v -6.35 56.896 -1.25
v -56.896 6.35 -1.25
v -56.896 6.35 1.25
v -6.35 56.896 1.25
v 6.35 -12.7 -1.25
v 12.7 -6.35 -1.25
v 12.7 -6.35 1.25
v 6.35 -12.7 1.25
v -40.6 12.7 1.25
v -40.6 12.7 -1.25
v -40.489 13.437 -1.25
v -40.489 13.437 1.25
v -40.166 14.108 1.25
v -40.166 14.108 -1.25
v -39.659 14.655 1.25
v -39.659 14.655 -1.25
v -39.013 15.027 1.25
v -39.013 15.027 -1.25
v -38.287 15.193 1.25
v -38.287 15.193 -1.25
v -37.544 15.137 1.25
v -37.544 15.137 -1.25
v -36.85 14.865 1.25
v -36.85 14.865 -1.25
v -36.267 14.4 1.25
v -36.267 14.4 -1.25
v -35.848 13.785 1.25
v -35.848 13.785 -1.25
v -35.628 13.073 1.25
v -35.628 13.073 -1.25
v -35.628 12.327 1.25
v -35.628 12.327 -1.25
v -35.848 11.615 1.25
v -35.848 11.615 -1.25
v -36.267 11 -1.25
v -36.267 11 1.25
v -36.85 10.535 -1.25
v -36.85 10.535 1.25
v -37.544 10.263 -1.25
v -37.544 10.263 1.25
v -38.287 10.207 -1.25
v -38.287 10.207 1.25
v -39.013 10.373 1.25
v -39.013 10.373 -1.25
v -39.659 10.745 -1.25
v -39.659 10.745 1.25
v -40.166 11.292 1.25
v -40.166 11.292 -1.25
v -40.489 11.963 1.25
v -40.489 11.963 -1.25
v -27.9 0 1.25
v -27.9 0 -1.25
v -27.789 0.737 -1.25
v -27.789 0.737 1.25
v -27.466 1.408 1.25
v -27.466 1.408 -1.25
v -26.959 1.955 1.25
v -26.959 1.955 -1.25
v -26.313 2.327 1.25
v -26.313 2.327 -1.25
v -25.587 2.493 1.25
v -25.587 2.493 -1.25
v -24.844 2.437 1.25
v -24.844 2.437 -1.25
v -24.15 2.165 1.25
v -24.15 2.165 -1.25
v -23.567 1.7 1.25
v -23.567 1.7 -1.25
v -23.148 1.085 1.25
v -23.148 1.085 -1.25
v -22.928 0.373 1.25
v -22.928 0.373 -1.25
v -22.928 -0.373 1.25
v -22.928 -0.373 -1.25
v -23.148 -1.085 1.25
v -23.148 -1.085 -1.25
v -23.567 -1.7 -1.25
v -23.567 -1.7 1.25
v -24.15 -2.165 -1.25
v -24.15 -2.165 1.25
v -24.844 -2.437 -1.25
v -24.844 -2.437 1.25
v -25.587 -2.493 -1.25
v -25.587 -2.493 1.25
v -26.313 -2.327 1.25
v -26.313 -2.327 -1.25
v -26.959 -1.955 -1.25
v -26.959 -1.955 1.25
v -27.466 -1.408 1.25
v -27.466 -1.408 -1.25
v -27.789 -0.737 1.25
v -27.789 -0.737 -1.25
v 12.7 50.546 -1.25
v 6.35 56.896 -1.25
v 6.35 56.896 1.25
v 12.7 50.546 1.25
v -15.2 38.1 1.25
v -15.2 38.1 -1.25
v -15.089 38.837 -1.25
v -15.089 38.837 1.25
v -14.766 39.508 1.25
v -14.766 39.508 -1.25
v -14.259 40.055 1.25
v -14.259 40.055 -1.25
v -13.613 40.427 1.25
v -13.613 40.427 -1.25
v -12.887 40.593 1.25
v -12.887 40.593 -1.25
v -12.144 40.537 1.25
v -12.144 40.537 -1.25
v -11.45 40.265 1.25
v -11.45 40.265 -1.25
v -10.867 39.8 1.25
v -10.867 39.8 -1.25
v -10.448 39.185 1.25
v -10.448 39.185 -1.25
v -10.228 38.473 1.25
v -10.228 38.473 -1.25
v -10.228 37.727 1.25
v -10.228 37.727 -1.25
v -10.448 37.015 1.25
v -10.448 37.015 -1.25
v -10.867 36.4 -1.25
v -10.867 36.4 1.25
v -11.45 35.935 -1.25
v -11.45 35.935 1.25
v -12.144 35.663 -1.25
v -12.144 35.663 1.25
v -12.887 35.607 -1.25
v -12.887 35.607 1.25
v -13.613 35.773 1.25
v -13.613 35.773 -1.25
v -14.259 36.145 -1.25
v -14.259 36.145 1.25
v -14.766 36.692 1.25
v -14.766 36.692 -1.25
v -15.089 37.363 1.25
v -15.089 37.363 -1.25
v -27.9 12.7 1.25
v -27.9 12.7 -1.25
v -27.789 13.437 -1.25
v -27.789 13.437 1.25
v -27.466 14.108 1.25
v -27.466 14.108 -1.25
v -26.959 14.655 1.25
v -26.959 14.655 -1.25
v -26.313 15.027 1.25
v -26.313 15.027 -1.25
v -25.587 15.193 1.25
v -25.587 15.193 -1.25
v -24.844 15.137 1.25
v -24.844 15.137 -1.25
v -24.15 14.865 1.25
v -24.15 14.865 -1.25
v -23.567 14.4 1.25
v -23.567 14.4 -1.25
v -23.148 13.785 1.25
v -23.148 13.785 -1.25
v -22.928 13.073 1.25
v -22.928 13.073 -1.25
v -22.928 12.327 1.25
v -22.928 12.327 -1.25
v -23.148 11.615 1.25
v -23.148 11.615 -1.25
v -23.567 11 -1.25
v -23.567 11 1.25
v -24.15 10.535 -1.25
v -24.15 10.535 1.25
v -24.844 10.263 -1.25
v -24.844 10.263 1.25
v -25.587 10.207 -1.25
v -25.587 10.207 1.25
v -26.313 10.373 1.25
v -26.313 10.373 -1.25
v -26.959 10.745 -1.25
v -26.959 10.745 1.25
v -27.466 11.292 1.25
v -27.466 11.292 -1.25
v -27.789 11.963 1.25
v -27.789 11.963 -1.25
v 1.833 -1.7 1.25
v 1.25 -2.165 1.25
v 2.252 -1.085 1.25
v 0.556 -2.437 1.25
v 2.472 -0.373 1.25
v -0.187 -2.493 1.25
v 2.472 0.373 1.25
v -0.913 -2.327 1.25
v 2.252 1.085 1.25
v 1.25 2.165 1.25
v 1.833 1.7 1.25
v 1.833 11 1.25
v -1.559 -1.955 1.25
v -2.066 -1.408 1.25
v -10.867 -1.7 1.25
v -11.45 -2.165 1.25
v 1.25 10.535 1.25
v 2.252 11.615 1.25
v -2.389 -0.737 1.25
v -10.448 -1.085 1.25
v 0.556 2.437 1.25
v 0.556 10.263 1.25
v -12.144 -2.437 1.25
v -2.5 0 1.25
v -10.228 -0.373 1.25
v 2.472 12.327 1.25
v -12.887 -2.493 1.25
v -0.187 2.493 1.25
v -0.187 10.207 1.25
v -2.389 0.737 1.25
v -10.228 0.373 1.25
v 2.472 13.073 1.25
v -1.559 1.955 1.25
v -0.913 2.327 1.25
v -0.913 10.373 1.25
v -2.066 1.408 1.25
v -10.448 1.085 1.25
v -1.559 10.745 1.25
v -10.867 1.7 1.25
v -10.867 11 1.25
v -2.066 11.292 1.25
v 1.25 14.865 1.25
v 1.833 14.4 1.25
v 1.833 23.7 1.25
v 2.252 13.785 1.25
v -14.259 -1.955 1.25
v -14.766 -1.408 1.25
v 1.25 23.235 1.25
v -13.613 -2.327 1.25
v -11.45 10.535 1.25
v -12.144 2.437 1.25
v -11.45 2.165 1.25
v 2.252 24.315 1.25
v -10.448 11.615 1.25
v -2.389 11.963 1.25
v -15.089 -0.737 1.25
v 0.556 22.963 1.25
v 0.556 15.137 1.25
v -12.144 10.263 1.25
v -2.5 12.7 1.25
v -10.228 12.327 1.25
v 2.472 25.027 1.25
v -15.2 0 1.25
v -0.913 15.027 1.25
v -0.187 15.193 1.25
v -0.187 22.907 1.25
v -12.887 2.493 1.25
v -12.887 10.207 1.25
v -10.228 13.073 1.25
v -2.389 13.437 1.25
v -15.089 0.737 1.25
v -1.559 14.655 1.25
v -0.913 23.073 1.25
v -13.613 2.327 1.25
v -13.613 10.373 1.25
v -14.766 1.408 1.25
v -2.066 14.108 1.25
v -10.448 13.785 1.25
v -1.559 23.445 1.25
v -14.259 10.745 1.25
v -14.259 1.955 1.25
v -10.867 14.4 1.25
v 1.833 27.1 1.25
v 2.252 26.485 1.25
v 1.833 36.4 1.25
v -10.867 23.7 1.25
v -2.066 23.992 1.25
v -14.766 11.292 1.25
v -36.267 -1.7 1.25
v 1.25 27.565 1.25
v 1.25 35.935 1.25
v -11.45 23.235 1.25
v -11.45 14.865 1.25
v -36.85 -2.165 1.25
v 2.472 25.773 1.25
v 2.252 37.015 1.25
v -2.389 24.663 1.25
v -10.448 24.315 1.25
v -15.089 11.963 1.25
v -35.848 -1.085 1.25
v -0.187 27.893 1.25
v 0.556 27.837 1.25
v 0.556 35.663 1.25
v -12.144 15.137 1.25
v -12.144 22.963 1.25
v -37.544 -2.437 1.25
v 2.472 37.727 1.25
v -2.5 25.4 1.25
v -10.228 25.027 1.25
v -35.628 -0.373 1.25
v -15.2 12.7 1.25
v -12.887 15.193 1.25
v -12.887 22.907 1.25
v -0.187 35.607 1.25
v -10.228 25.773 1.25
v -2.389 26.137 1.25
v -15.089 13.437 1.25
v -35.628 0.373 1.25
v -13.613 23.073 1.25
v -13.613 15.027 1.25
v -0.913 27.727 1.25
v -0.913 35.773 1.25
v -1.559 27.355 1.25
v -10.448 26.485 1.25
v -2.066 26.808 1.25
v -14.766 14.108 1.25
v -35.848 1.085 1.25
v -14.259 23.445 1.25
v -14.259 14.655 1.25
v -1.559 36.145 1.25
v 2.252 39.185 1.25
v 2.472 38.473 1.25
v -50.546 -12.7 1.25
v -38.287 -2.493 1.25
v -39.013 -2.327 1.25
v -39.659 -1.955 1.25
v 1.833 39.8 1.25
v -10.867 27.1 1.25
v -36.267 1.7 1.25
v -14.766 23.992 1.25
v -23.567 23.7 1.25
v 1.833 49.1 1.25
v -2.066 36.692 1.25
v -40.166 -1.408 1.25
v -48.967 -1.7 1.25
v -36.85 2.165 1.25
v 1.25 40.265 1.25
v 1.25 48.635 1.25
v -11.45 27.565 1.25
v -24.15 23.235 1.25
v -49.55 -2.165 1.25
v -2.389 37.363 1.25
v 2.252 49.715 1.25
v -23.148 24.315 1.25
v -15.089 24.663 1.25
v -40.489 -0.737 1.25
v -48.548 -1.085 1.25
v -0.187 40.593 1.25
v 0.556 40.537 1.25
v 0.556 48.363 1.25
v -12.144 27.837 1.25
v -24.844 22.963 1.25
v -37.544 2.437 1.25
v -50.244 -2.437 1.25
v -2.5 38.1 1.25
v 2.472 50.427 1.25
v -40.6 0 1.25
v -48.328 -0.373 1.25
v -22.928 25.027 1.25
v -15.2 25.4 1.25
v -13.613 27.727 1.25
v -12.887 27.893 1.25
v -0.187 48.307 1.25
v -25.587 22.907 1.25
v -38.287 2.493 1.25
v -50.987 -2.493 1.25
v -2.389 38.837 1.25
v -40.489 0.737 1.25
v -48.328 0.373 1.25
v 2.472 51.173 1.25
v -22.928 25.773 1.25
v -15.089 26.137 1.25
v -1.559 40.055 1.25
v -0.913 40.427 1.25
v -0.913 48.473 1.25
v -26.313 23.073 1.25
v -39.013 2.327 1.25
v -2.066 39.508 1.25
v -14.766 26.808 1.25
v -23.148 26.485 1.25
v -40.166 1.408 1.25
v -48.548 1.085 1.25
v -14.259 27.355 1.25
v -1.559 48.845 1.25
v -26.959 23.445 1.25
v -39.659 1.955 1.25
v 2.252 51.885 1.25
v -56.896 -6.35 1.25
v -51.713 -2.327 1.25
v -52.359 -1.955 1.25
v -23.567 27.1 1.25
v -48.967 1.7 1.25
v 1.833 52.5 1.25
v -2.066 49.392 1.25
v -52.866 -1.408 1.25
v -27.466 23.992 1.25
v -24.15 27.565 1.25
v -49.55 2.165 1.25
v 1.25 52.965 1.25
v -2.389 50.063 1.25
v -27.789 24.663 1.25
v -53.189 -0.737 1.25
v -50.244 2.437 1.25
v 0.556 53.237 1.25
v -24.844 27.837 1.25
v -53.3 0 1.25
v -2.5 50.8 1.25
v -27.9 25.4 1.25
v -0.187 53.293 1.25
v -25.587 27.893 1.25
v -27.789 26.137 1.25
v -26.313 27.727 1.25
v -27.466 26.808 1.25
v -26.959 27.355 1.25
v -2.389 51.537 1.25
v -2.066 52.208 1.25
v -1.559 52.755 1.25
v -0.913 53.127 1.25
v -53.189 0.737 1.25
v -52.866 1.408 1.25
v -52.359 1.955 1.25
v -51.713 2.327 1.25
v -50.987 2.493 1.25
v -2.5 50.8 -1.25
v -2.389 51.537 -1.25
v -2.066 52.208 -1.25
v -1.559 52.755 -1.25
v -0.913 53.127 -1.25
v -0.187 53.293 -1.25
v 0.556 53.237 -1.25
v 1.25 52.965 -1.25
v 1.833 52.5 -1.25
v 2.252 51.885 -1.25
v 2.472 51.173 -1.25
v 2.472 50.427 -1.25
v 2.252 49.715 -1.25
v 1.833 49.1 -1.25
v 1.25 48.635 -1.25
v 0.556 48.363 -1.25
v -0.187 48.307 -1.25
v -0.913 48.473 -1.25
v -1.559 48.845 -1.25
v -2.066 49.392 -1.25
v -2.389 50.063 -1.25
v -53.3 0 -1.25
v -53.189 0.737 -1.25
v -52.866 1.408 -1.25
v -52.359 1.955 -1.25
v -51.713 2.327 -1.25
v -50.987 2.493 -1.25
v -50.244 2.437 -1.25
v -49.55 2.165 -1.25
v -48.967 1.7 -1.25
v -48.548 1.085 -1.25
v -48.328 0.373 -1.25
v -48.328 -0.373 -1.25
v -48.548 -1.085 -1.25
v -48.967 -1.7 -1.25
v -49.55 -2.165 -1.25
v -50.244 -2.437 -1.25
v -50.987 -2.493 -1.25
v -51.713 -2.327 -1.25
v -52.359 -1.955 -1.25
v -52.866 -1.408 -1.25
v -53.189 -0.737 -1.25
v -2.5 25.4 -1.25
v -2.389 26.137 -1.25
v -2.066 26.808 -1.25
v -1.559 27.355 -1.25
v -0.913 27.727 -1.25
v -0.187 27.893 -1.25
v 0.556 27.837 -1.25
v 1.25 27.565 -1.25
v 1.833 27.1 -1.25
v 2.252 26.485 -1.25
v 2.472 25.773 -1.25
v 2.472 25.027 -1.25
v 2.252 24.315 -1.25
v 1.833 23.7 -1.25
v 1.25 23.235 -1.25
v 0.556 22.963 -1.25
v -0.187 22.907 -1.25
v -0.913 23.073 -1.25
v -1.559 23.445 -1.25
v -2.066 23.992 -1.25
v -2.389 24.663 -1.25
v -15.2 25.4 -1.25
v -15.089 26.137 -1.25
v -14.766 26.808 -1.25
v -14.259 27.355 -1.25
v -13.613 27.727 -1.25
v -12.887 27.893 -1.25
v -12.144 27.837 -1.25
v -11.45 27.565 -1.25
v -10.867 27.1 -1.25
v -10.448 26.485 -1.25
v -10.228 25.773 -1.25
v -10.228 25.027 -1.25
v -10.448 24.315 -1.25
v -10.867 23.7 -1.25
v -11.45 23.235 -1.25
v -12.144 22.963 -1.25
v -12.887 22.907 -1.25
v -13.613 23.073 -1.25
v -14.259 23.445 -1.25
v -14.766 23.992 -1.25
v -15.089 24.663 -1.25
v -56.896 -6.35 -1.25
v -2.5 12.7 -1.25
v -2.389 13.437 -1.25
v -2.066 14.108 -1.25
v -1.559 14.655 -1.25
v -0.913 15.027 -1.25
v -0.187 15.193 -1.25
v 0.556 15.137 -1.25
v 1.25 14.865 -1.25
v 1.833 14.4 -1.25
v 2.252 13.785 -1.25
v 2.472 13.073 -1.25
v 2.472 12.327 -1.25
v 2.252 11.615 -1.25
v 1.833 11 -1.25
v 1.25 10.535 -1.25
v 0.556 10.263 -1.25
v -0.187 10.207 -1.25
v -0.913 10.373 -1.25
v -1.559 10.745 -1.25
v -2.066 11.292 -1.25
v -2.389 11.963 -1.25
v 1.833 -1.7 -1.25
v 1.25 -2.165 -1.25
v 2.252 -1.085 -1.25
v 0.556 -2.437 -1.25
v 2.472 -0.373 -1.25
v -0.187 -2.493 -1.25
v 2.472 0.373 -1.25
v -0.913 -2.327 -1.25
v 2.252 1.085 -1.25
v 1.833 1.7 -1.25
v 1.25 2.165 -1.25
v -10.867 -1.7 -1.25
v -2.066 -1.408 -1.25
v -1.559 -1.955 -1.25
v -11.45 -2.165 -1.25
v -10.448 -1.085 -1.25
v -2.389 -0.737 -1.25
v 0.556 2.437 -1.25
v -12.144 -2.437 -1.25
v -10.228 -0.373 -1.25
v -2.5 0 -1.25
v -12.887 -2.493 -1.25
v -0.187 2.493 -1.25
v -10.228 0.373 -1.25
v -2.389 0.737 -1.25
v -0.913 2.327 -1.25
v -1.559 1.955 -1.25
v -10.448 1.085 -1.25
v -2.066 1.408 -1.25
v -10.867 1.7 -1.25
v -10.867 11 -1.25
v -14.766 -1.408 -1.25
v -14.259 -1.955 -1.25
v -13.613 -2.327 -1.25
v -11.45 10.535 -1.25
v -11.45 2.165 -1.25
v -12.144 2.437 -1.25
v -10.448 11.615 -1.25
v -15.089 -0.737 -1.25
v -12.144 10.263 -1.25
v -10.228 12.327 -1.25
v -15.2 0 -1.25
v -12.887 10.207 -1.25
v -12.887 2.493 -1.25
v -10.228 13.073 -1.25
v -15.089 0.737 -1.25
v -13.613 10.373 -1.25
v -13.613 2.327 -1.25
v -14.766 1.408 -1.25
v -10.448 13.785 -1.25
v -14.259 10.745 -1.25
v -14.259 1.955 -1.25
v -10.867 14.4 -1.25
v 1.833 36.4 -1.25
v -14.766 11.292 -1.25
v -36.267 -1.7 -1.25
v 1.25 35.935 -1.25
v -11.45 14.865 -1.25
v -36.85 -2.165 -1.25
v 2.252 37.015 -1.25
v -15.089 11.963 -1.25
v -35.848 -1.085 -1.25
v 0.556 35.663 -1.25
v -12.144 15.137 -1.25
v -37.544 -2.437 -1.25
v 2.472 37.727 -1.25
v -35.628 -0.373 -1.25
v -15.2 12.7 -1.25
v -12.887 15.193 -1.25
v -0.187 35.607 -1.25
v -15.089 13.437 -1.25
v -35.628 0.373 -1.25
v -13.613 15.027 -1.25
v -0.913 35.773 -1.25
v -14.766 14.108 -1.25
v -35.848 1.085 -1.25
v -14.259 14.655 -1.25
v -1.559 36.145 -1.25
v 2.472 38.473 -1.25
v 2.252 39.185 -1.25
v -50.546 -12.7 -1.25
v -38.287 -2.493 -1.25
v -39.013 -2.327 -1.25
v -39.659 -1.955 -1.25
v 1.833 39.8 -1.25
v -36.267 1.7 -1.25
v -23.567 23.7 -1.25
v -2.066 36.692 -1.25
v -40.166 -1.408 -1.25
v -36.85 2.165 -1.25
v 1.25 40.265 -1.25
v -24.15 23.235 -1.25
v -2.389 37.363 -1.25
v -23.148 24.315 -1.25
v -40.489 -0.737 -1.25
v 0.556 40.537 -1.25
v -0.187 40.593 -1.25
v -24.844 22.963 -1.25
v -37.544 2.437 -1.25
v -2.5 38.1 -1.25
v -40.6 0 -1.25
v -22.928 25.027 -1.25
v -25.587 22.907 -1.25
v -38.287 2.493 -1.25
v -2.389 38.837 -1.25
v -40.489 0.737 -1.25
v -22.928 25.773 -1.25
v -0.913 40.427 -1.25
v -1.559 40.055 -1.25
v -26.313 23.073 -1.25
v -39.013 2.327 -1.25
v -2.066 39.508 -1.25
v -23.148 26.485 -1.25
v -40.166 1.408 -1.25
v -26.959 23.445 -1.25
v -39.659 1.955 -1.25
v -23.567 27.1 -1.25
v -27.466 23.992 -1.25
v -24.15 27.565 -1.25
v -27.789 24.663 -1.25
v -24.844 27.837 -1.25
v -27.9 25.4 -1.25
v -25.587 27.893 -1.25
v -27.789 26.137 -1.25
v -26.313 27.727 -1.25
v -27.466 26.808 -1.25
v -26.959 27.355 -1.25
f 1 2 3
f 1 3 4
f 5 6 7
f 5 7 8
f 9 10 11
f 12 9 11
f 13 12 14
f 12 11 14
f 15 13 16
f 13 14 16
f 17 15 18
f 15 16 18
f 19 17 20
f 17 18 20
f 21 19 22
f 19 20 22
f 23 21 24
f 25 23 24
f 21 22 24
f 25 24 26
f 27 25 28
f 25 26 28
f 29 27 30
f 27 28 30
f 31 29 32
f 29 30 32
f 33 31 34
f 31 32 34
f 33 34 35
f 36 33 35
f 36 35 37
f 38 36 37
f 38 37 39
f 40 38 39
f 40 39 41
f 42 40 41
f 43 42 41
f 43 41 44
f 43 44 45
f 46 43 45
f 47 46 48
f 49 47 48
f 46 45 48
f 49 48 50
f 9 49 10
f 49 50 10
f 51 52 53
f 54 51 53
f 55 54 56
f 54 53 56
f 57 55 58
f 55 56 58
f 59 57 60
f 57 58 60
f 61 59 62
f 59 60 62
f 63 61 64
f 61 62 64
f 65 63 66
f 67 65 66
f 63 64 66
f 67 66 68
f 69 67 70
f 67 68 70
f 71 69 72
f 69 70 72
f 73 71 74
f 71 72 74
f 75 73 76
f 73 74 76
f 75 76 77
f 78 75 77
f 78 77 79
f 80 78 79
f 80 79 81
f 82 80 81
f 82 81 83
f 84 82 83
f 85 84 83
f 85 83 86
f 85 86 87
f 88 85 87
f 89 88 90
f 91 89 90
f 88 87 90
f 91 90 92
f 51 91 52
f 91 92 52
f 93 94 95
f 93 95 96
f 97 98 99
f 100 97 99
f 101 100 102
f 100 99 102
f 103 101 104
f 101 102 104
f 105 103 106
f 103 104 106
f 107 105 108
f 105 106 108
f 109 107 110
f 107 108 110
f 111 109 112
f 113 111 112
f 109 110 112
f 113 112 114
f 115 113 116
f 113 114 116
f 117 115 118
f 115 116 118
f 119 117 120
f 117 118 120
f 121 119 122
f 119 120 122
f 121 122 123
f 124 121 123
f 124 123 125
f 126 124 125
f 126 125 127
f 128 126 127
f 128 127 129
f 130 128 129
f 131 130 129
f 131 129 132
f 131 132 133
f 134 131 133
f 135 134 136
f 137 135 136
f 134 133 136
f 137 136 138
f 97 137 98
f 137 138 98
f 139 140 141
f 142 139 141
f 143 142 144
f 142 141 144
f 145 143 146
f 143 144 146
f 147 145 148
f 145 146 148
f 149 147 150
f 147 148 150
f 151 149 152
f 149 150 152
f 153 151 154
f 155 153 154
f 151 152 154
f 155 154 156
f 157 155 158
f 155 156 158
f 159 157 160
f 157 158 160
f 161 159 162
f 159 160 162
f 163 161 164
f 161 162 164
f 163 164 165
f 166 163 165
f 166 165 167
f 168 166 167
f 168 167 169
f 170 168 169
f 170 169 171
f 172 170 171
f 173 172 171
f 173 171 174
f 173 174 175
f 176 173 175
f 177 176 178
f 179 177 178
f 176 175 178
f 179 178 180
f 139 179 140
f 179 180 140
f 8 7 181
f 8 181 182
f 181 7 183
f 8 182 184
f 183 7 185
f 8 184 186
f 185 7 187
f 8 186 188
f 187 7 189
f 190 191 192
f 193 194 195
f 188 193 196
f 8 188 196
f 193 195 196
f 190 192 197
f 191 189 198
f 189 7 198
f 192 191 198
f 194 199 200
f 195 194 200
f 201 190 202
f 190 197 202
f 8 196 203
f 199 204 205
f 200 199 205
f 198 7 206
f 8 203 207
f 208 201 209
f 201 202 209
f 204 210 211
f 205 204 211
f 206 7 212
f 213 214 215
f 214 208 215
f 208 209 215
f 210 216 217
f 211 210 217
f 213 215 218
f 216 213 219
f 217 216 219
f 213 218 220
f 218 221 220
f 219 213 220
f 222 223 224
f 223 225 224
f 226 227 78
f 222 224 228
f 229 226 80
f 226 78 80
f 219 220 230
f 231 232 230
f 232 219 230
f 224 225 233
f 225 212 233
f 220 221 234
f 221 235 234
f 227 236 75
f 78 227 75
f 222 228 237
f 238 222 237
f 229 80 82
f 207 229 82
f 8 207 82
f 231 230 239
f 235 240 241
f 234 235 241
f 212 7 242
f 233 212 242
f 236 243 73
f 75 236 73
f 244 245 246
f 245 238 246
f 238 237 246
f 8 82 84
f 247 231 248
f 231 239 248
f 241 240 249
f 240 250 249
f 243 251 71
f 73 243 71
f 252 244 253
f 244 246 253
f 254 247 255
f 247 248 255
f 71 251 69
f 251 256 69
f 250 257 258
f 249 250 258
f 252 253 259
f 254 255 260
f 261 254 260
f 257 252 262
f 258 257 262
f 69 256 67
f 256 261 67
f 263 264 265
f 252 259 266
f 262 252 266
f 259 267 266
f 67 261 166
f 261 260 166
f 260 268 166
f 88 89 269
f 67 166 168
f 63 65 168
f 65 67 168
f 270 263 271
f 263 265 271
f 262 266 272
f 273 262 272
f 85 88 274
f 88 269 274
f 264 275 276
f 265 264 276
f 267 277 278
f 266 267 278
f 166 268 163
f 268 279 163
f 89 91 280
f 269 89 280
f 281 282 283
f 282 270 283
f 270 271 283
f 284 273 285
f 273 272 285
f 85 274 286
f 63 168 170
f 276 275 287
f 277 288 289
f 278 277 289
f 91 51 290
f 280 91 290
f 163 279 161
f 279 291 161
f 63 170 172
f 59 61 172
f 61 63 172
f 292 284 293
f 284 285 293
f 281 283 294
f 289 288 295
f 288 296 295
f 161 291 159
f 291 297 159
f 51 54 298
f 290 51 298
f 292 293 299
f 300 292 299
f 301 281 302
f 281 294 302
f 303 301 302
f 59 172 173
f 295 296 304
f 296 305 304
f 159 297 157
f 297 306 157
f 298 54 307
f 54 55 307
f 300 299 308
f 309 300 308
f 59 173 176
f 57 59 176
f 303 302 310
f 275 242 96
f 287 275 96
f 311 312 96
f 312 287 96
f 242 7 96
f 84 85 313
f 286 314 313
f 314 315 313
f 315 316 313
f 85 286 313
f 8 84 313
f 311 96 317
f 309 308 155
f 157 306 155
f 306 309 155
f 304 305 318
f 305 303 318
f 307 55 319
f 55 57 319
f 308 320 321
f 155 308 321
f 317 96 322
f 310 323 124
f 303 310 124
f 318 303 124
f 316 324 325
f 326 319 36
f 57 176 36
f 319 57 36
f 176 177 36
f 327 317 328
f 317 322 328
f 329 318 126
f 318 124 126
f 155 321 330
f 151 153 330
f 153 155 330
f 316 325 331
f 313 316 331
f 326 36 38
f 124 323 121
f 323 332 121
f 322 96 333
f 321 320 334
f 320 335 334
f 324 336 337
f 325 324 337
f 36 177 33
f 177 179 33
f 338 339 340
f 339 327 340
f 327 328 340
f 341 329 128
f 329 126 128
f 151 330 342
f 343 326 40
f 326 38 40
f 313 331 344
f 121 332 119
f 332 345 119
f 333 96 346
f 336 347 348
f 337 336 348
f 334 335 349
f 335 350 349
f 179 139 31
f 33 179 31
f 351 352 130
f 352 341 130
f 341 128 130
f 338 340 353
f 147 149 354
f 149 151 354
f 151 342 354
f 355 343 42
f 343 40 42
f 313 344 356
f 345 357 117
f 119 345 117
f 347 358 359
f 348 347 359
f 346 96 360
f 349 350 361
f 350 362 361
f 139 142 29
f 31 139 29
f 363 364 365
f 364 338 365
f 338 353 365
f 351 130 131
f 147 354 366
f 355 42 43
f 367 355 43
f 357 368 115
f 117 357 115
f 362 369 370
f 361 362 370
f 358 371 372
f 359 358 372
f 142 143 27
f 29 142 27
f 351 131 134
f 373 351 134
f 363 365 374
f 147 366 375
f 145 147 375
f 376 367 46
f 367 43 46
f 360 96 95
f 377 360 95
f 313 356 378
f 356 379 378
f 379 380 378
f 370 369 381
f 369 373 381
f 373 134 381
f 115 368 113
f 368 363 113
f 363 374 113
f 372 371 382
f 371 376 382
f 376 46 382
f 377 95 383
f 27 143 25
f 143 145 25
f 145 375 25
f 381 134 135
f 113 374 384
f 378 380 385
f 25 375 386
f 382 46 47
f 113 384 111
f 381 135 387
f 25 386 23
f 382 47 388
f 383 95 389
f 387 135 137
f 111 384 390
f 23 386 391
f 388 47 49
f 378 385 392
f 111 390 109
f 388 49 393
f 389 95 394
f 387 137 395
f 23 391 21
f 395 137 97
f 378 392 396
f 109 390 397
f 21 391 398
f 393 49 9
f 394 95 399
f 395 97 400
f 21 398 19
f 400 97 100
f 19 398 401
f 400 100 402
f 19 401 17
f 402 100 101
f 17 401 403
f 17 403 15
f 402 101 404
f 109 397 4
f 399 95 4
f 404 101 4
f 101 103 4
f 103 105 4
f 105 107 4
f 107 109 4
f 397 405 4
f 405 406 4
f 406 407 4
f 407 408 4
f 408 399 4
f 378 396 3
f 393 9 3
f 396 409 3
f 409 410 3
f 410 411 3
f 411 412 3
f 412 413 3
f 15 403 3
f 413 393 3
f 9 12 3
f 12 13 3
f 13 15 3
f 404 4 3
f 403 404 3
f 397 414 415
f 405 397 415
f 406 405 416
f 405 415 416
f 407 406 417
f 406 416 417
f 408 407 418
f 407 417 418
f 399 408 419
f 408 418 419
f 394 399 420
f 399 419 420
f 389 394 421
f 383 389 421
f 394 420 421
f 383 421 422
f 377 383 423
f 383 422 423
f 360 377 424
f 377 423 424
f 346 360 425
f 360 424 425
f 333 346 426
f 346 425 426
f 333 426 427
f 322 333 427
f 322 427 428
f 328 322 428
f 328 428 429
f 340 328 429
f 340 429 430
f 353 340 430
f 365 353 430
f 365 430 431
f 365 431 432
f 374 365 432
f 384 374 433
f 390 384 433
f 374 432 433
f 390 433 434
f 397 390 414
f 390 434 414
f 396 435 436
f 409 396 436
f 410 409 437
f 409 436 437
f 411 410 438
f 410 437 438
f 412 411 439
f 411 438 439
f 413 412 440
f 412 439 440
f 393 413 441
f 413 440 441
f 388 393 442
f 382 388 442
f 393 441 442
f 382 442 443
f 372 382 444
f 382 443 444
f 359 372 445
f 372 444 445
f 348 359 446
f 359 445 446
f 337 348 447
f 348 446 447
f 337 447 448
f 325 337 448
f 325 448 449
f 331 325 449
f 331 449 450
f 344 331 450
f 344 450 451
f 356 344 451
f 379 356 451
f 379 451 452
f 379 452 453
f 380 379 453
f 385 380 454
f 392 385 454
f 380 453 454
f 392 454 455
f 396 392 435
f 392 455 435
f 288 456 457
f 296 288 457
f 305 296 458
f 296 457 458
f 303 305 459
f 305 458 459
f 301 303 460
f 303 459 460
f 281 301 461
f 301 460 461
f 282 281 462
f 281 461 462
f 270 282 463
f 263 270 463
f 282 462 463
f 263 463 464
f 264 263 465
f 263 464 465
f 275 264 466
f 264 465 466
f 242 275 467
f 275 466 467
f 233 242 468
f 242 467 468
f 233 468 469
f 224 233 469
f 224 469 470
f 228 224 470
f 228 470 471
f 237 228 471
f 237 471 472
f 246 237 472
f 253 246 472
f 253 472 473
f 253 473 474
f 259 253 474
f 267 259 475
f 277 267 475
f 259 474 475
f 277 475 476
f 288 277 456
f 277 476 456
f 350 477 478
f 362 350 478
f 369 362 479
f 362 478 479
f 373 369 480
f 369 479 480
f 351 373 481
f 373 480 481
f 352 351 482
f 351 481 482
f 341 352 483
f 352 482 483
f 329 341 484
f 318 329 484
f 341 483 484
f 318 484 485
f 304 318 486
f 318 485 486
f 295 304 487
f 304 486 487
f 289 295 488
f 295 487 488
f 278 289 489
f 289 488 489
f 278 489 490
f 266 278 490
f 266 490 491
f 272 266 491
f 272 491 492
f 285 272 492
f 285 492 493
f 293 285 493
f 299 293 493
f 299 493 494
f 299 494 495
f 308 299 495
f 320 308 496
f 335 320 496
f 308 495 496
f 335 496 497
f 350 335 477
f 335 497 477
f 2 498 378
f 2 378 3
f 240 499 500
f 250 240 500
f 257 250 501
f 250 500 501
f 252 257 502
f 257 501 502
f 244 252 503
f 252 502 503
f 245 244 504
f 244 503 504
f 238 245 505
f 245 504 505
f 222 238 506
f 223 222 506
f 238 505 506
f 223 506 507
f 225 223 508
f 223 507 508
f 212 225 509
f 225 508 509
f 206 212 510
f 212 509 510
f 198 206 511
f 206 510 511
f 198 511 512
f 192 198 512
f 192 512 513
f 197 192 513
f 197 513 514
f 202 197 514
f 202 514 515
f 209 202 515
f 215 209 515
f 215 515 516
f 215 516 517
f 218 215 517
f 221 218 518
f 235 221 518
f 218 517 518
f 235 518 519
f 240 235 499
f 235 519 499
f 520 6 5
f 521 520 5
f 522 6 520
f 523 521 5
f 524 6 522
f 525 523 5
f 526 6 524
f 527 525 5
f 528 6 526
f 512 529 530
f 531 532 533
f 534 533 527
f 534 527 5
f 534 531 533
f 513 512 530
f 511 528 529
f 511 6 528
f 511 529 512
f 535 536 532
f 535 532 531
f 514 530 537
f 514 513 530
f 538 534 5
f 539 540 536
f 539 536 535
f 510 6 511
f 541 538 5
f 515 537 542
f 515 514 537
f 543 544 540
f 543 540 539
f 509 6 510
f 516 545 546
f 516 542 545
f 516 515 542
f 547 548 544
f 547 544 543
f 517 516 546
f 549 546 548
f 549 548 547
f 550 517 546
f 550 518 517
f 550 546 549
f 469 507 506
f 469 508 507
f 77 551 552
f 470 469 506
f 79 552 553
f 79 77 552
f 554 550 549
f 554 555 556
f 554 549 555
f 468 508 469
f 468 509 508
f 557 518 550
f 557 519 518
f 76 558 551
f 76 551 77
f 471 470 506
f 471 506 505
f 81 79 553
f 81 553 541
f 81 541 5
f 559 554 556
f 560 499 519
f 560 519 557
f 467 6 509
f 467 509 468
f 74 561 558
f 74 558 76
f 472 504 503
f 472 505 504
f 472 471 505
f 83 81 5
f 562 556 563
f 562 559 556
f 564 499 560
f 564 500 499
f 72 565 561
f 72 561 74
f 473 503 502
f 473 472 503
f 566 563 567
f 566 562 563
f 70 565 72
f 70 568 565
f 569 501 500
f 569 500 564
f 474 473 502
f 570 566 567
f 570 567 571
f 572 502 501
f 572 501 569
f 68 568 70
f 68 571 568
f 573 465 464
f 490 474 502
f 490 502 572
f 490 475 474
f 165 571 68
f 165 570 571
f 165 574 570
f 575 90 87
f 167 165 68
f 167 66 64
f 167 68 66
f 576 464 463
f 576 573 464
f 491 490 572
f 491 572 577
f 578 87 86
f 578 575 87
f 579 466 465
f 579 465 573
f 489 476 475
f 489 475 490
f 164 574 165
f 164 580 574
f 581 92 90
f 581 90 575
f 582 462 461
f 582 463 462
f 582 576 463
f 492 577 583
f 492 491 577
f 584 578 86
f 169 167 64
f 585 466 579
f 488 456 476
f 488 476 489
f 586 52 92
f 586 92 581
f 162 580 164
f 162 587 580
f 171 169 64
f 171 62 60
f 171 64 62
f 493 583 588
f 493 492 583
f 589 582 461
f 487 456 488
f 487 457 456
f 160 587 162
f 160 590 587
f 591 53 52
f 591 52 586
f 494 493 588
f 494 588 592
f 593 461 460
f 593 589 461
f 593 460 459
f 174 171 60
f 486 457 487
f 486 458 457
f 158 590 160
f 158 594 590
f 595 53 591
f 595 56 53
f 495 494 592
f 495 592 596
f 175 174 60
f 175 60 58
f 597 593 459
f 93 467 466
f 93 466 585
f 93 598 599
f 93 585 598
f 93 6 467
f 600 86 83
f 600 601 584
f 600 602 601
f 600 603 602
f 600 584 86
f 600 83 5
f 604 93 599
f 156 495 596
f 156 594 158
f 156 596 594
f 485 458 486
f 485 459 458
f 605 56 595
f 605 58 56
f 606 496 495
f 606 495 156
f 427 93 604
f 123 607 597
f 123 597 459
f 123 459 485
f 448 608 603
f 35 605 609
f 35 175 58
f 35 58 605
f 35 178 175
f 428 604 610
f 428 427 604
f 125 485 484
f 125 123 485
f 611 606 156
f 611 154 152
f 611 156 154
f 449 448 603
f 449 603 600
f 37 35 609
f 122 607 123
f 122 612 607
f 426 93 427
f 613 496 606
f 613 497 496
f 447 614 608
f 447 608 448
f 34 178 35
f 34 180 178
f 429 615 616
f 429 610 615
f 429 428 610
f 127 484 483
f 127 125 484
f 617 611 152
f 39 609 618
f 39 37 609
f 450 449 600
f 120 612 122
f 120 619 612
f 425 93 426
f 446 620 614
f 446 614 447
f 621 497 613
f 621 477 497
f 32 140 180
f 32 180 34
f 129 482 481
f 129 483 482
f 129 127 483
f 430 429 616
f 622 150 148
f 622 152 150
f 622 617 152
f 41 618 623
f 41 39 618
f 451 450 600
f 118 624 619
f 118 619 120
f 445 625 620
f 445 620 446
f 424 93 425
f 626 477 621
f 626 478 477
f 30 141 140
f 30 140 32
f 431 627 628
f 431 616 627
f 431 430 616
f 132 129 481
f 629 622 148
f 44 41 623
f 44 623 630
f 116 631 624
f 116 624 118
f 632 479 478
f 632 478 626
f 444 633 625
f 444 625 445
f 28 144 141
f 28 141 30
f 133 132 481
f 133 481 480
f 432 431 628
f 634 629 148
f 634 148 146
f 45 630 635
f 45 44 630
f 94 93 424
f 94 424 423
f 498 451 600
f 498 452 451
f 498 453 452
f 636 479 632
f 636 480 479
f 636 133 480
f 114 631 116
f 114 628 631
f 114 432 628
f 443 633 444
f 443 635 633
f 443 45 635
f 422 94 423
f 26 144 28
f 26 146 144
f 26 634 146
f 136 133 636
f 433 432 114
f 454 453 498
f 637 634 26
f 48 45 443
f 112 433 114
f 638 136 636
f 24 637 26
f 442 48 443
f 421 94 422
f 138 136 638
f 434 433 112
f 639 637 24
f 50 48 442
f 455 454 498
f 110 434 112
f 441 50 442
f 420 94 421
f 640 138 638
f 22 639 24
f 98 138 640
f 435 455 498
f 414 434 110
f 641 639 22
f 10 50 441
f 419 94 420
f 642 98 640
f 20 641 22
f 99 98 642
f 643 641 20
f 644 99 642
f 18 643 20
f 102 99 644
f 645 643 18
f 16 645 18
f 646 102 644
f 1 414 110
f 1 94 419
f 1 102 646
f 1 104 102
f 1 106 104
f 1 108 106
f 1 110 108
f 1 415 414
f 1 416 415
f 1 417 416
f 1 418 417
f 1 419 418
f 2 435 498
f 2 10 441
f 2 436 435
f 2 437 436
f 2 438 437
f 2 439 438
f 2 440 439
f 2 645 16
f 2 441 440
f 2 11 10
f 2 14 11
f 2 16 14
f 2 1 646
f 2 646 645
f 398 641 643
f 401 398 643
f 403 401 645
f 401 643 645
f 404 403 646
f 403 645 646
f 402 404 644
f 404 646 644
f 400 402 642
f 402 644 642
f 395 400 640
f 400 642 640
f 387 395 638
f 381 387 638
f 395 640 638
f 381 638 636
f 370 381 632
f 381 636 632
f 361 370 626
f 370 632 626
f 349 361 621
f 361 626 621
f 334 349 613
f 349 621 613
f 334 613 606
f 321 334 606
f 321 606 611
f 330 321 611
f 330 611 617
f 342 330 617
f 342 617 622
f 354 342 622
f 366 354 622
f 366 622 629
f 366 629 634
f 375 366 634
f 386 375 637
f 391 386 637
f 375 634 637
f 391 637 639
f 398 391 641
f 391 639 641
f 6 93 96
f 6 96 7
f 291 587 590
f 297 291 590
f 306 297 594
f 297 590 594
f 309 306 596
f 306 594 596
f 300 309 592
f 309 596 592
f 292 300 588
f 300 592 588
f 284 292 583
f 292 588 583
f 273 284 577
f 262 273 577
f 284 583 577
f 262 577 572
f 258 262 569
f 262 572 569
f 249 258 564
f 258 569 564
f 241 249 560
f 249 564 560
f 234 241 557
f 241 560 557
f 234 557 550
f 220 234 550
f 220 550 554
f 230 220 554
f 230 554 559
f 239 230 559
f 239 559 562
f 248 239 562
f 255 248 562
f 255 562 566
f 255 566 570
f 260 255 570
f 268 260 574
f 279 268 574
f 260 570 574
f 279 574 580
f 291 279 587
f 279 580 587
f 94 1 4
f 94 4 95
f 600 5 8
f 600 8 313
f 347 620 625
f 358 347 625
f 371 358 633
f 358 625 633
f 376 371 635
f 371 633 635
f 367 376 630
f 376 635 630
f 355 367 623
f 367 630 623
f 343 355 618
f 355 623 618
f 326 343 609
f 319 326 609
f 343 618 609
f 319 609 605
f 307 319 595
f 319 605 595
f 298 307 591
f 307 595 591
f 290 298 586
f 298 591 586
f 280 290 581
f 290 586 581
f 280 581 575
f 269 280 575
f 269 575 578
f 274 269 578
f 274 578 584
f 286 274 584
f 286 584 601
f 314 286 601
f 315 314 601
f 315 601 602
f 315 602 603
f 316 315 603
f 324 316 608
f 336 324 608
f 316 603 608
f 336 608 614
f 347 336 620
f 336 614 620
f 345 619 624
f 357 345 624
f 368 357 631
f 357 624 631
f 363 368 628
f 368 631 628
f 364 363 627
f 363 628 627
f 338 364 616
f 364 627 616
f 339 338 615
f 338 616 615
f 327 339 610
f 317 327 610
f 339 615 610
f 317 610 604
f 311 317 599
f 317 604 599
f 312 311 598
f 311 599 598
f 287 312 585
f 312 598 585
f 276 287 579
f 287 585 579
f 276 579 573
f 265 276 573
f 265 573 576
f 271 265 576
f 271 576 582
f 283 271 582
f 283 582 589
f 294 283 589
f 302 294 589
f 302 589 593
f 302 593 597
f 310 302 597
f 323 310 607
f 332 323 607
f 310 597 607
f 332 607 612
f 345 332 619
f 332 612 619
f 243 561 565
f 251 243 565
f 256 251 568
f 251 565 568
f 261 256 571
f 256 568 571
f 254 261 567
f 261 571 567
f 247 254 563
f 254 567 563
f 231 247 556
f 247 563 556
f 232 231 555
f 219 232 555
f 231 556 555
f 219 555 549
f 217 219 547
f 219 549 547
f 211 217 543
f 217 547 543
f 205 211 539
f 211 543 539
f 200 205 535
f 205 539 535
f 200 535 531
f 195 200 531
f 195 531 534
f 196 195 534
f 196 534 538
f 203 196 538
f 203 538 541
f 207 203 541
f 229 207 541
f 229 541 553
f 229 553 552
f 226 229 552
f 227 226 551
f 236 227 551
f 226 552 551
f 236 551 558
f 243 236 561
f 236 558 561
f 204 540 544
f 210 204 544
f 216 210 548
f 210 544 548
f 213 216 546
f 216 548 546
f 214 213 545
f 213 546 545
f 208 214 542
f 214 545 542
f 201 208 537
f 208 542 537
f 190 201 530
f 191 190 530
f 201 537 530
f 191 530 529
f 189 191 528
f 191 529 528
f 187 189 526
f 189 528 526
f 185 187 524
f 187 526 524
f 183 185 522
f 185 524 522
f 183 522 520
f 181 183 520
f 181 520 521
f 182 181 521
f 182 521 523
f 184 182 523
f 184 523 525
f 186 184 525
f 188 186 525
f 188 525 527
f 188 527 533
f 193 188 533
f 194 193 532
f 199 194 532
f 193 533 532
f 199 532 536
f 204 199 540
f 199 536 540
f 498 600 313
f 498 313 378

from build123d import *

# Parameters (mm, degrees)
SKETCH1_R           = 2.5
BOSS_EXTRUDE1_DEPTH = 2.5


with BuildPart() as part:
    # Sketch1 → Boss-Extrude1 (new body)
    with BuildSketch(Plane(origin=(0, 0, -1.25), x_dir=(-1, 0, 0), z_dir=(0, 0, -1))):
        Polygon((-6.35, -12.7), (50.546, -12.7), (56.896, -6.35), (56.896, 6.35), (6.35, 56.896), (-6.35, 56.896), (-12.7, 50.546), (-12.7, -6.35), align=None)
        with Locations((0, 12.7)):
            Circle(SKETCH1_R, mode=Mode.SUBTRACT)
        with Locations((0, 25.4)):
            Circle(SKETCH1_R, mode=Mode.SUBTRACT)
        with Locations((12.7, 0)):
            Circle(SKETCH1_R, mode=Mode.SUBTRACT)
        with Locations((25.4, 0)):
            Circle(SKETCH1_R, mode=Mode.SUBTRACT)
        Circle(SKETCH1_R, mode=Mode.SUBTRACT)
        with Locations((50.8, 0)):
            Circle(SKETCH1_R, mode=Mode.SUBTRACT)
        with Locations((38.1, 0)):
            Circle(SKETCH1_R, mode=Mode.SUBTRACT)
        with Locations((0, 50.8)):
            Circle(SKETCH1_R, mode=Mode.SUBTRACT)
        with Locations((0, 38.1)):
            Circle(SKETCH1_R, mode=Mode.SUBTRACT)
        with Locations((12.7, 12.7)):
            Circle(SKETCH1_R, mode=Mode.SUBTRACT)
        with Locations((12.7, 25.4)):
            Circle(SKETCH1_R, mode=Mode.SUBTRACT)
        with Locations((12.7, 38.1)):
            Circle(SKETCH1_R, mode=Mode.SUBTRACT)
        with Locations((25.4, 12.7)):
            Circle(SKETCH1_R, mode=Mode.SUBTRACT)
        with Locations((25.4, 25.4)):
            Circle(SKETCH1_R, mode=Mode.SUBTRACT)
        with Locations((38.1, 12.7)):
            Circle(SKETCH1_R, mode=Mode.SUBTRACT)
    extrude(amount=-BOSS_EXTRUDE1_DEPTH)


solid = part.part
